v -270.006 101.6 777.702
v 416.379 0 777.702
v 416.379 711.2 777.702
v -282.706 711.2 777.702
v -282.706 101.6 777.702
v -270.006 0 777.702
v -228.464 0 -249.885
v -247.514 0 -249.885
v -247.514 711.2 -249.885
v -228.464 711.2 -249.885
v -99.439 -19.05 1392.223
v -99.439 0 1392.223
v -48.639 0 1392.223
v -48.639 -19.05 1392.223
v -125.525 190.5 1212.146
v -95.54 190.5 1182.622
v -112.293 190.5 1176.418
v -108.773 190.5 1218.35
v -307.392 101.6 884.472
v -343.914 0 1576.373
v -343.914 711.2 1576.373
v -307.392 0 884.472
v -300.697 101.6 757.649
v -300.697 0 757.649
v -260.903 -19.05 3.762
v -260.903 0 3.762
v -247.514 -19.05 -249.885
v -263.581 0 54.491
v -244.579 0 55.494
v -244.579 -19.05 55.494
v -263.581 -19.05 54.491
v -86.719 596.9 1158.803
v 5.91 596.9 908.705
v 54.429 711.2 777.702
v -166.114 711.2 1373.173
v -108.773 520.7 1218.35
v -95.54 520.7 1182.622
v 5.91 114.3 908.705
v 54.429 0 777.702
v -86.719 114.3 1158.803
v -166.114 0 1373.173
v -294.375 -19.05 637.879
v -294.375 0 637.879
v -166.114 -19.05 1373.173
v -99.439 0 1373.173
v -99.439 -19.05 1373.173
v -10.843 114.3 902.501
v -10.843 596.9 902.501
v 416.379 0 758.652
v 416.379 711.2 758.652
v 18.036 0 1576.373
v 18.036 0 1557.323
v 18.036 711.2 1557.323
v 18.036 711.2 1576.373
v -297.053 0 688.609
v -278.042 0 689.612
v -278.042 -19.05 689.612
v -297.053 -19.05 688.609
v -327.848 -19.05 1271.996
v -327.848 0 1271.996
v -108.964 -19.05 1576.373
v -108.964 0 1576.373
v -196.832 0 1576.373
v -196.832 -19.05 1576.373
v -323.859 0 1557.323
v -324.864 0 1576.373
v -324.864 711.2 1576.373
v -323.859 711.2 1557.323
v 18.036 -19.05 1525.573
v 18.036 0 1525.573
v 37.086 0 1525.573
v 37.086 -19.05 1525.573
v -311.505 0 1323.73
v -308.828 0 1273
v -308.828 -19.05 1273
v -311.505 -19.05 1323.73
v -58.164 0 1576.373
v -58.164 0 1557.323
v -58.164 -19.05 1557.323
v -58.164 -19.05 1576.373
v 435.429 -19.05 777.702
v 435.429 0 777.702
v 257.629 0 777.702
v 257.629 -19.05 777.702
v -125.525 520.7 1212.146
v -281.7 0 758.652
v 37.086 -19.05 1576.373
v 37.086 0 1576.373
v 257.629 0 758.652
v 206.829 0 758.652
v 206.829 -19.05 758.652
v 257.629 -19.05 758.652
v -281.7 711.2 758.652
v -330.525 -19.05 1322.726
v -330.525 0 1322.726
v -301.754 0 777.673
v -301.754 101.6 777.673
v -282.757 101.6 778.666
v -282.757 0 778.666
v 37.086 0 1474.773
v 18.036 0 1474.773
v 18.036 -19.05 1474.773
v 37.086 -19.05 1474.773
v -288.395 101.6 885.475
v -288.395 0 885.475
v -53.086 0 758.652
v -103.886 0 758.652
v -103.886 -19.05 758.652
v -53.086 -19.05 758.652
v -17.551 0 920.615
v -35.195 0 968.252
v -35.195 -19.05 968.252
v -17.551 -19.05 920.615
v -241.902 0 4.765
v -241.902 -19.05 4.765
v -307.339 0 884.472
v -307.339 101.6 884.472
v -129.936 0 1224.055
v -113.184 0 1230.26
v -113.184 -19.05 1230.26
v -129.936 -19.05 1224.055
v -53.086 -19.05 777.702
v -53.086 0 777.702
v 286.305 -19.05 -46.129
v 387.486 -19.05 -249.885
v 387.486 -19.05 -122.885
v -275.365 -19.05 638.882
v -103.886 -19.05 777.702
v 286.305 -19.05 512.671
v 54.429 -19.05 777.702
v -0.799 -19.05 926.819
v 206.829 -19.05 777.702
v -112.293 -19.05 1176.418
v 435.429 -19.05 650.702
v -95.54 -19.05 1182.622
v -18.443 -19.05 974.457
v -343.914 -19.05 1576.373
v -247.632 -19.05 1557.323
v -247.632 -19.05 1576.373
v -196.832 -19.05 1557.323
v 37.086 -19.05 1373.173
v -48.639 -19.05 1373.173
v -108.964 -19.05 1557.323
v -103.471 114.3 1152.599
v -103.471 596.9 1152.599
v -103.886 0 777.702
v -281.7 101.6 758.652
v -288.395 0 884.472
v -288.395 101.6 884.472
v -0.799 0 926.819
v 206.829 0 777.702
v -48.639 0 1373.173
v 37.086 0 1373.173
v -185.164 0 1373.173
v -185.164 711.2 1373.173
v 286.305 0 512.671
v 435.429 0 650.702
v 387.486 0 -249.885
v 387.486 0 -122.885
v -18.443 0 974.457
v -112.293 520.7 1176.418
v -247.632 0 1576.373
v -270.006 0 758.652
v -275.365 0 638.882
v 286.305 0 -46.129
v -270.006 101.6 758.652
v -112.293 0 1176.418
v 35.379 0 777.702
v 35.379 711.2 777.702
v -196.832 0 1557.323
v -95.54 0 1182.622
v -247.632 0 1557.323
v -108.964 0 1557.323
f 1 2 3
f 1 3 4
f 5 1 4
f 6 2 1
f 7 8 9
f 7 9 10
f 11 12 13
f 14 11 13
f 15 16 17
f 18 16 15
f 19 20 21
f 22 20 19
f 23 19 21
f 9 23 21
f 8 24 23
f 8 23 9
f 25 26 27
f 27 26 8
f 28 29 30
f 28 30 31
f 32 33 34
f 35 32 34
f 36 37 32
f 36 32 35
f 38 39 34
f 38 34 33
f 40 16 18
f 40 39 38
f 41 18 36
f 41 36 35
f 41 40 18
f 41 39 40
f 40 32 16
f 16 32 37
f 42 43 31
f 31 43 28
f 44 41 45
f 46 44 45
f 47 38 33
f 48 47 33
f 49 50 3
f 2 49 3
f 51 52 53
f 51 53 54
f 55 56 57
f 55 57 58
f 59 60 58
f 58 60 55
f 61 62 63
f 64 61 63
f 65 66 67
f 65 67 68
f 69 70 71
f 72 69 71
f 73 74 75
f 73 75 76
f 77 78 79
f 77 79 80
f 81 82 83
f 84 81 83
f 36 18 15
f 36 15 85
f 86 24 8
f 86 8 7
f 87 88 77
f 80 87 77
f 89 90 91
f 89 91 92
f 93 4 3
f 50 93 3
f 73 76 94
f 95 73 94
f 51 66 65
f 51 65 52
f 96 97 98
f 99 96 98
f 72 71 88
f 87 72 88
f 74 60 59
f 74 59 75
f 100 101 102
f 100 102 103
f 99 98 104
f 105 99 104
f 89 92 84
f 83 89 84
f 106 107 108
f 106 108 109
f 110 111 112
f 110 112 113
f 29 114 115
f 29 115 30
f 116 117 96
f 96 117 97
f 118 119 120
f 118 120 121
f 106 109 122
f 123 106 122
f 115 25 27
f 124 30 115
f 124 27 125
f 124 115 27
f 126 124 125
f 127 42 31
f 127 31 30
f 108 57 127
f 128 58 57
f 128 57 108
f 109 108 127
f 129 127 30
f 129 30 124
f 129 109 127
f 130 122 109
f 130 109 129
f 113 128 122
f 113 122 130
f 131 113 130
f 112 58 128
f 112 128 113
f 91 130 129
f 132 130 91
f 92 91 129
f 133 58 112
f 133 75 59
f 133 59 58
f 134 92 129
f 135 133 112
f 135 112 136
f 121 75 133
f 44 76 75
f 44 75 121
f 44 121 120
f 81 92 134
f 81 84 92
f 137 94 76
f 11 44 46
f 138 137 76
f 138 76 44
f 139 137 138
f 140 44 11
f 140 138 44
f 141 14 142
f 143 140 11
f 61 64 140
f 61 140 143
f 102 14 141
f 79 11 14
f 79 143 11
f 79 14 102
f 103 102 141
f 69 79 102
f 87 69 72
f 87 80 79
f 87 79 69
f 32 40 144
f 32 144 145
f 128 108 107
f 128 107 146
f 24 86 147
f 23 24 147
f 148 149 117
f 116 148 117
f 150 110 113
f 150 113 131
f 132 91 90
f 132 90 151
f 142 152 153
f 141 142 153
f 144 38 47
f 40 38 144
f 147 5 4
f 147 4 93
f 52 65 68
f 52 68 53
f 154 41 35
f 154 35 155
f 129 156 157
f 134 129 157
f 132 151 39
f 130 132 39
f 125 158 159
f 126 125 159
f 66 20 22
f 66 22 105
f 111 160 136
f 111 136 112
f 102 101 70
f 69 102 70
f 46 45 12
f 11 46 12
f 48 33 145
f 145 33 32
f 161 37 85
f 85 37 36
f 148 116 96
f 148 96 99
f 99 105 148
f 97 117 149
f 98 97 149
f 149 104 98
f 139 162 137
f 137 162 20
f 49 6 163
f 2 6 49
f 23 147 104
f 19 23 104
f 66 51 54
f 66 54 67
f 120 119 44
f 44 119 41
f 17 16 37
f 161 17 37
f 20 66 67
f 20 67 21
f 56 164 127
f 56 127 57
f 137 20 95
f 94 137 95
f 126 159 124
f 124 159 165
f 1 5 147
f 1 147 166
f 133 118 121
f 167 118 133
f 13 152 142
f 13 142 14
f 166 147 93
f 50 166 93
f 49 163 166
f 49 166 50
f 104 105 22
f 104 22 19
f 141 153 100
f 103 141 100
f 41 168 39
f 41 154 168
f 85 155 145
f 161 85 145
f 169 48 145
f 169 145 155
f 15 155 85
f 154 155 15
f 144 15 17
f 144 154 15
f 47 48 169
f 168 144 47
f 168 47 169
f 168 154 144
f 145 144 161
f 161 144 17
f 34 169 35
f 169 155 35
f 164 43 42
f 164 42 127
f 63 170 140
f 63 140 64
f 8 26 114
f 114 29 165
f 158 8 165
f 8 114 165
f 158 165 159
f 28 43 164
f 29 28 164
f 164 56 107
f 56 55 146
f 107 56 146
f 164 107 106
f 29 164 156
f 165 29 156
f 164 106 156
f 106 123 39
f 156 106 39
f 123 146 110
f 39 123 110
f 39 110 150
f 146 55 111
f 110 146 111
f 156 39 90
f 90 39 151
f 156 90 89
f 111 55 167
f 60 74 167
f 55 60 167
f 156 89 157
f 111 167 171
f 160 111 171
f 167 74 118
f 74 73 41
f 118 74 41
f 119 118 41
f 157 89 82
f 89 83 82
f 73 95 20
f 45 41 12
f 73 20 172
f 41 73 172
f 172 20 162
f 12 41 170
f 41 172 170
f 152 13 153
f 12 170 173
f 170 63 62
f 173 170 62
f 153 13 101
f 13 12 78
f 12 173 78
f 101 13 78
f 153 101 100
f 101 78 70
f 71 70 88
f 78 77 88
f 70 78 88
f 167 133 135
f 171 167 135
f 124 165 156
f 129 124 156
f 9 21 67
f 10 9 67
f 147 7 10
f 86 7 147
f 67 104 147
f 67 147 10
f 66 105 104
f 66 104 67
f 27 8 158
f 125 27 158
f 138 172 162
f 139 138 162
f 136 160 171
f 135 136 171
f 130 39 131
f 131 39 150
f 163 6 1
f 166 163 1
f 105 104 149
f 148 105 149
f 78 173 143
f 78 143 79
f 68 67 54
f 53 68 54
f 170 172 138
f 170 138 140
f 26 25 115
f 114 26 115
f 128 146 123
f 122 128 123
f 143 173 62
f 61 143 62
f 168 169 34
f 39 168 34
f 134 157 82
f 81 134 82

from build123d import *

# Parameters (mm, degrees)
F2_DEPTH  = 19.05
F3_W      = 50.8
F3_H      = 19.05
F3_W_2    = 19.05
F3_H_2    = 50.8
F4_DEPTH  = 19.05
F6_DEPTH  = 711.2
F7_W      = 12.7
F7_H      = 101.6
F8_DEPTH  = 19.05
F10_DEPTH = 711.2
F11_W     = 101.6
F11_H     = 127
F12_DEPTH = 19.0235155119
F14_DEPTH = 101.6
F16_DEPTH = 711.2
F18_DEPTH = 711.2
F19_W     = 482.6
F19_H     = 266.7
F19_W_2   = 330.2
F19_H_2   = 38.1
F20_DEPTH = 17.864127403


with BuildPart() as f2:
    # F1 (on face) → F2 (new body)
    with BuildSketch(Plane.XZ):
        Polygon((37.0856592504, 1373.1727089956), (37.0856592504, 1576.3727089956), (-166.1143407496, 1576.3727089956), (-343.9143407496, 1576.3727089956), (-247.5140121902, -249.8847801481), (387.4859878098, -249.8847801481), (387.4859878098, -122.8847801481), (286.3054851186, -46.1286346276), (286.3054851186, 512.6713653724), (435.4290591833, 650.7017955615), (435.4290591833, 736.0118588999), (435.4290591833, 777.7017955615), (54.4290591833, 777.7017955615), (-166.1143407496, 1373.1727089956), align=None)
    extrude(amount=F2_DEPTH)

    # F3 (on face) → F4 (cut, through all)
    with BuildSketch(Plane.XZ):
        with Locations((232.2290591833, 768.1767955615)):
            Rectangle(F3_W, F3_H)
        with Locations((-78.4855475583, 768.1767955615)):
            Rectangle(F3_W, F3_H)
        Polygon((-278.0422529634, 689.6121515597), (-297.0530699221, 688.6086517729), (-294.3752830177, 637.8792770745), (-275.36519378, 638.8824594688), align=None)
        Polygon((-0.7992807969, 926.8192484775), (-18.4427527915, 974.4569215522), (-35.1948287952, 968.2524878604), (-17.5513568006, 920.6148147857), align=None)
        Polygon((-95.540452771, 1182.6220166967), (-113.1839247657, 1230.2596897714), (-129.9360007694, 1224.0552560796), (-112.2925287748, 1176.4175830049), align=None)
        Polygon((-311.5053092422, 1323.7298251432), (-330.5254062274, 1322.7258355034), (-327.847619323, 1271.996460805), (-308.8282500516, 1273.0001329164), align=None)
        with Locations((-74.0393407496, 1382.6977089956)):
            Rectangle(F3_W, F3_H)
        with Locations((27.5606592504, 1500.1727089956)):
            Rectangle(F3_W_2, F3_H_2)
        with Locations((-83.5643407496, 1566.8477089956)):
            Rectangle(F3_W, F3_H)
        with Locations((-222.2322512977, 1566.8477089956)):
            Rectangle(F3_W, F3_H)
        Polygon((-244.5791966847, 55.4944779763), (-263.5807336168, 54.4914680425), (-260.9029467124, 3.762093344), (-241.9021521824, 4.7650640897), align=None)
    extrude(amount=F4_DEPTH, mode=Mode.SUBTRACT)


with BuildPart() as f6:
    # F5 (on face) → F6 (new body)
    with BuildSketch(Plane.XZ):
        Polygon((416.3790591833, 758.6517955615), (416.3790591833, 777.7017955615), (54.4290591833, 777.7017955615), (-282.7059162538, 777.7017955615), (-281.7003481617, 758.6517955615), align=None)
    extrude(amount=-F6_DEPTH)

    # F7 (on face) → F8 (cut, through all)
    with BuildSketch(Plane.XY.offset(777.7017955615)):
        with Locations((-276.3559162538, 50.8)):
            Rectangle(F7_W, F7_H)
    extrude(amount=-F8_DEPTH, mode=Mode.SUBTRACT)


with BuildPart() as f10:
    # F9 (on face) → F10 (new body)
    with BuildSketch(Plane.XZ):
        Polygon((-324.8643407496, 1576.3727089956), (-343.9143407496, 1576.3727089956), (-247.5140121902, -249.8847801481), (-228.4640121902, -249.8847801481), align=None)
    extrude(amount=-F10_DEPTH)

    # F11 (on face) → F12 (cut, through all)
    with BuildSketch(Plane(origin=(-240.9829032815, 0, -12.7204576527), x_dir=(0, 1, 0), z_dir=(0.9986097382, 0, 0.0527123406))):
        with Locations((50.8, 835.9461556291)):
            Rectangle(F11_W, F11_H)
    extrude(amount=-F12_DEPTH, mode=Mode.SUBTRACT)


with BuildPart() as f14:
    # F13 (on face) → F14 (new body, through all)
    with BuildSketch(Plane.XZ.offset(-101.6)):
        Polygon((-282.7568129958, 778.666009663), (-288.3948154228, 885.4752323076), (-288.3948154228, 884.4724582764), (-307.3394434827, 884.4724582764), (-301.7543718562, 777.672537698), align=None)
    extrude(amount=F14_DEPTH)


with BuildPart() as f16:
    # F15 (on face) → F16 (new body)
    with BuildSketch(Plane.XZ):
        Polygon((18.0356592504, 1576.3727089956), (-166.1143407496, 1576.3727089956), (-324.8643407496, 1576.3727089956), (-323.8587726574, 1557.3227089956), (18.0356592504, 1557.3227089956), align=None)
    extrude(amount=-F16_DEPTH)


with BuildPart() as f18:
    # F17 (on face) → F18 (new body)
    with BuildSketch(Plane.XZ):
        Polygon((35.3790591833, 777.7017955615), (54.4290591833, 777.7017955615), (-166.1143407496, 1373.1727089956), (-185.1643407496, 1373.1727089956), align=None)
    extrude(amount=-F18_DEPTH)

    # F19 (on face) → F20 (cut, through all)
    with BuildSketch(Plane(origin=(301.1548009874, 0, 111.5381158297), x_dir=(0, 1, 0), z_dir=(0.93774947, 0, 0.3473124408))):
        with Locations((355.6, 983.4355571889)):
            Rectangle(F19_W, F19_H)
        with Locations((355.6, 1161.2355571889)):
            Rectangle(F19_W_2, F19_H_2)
    extrude(amount=-F20_DEPTH, mode=Mode.SUBTRACT)


solid = Compound([f2.part, f6.part, f10.part, f14.part, f16.part, f18.part])
